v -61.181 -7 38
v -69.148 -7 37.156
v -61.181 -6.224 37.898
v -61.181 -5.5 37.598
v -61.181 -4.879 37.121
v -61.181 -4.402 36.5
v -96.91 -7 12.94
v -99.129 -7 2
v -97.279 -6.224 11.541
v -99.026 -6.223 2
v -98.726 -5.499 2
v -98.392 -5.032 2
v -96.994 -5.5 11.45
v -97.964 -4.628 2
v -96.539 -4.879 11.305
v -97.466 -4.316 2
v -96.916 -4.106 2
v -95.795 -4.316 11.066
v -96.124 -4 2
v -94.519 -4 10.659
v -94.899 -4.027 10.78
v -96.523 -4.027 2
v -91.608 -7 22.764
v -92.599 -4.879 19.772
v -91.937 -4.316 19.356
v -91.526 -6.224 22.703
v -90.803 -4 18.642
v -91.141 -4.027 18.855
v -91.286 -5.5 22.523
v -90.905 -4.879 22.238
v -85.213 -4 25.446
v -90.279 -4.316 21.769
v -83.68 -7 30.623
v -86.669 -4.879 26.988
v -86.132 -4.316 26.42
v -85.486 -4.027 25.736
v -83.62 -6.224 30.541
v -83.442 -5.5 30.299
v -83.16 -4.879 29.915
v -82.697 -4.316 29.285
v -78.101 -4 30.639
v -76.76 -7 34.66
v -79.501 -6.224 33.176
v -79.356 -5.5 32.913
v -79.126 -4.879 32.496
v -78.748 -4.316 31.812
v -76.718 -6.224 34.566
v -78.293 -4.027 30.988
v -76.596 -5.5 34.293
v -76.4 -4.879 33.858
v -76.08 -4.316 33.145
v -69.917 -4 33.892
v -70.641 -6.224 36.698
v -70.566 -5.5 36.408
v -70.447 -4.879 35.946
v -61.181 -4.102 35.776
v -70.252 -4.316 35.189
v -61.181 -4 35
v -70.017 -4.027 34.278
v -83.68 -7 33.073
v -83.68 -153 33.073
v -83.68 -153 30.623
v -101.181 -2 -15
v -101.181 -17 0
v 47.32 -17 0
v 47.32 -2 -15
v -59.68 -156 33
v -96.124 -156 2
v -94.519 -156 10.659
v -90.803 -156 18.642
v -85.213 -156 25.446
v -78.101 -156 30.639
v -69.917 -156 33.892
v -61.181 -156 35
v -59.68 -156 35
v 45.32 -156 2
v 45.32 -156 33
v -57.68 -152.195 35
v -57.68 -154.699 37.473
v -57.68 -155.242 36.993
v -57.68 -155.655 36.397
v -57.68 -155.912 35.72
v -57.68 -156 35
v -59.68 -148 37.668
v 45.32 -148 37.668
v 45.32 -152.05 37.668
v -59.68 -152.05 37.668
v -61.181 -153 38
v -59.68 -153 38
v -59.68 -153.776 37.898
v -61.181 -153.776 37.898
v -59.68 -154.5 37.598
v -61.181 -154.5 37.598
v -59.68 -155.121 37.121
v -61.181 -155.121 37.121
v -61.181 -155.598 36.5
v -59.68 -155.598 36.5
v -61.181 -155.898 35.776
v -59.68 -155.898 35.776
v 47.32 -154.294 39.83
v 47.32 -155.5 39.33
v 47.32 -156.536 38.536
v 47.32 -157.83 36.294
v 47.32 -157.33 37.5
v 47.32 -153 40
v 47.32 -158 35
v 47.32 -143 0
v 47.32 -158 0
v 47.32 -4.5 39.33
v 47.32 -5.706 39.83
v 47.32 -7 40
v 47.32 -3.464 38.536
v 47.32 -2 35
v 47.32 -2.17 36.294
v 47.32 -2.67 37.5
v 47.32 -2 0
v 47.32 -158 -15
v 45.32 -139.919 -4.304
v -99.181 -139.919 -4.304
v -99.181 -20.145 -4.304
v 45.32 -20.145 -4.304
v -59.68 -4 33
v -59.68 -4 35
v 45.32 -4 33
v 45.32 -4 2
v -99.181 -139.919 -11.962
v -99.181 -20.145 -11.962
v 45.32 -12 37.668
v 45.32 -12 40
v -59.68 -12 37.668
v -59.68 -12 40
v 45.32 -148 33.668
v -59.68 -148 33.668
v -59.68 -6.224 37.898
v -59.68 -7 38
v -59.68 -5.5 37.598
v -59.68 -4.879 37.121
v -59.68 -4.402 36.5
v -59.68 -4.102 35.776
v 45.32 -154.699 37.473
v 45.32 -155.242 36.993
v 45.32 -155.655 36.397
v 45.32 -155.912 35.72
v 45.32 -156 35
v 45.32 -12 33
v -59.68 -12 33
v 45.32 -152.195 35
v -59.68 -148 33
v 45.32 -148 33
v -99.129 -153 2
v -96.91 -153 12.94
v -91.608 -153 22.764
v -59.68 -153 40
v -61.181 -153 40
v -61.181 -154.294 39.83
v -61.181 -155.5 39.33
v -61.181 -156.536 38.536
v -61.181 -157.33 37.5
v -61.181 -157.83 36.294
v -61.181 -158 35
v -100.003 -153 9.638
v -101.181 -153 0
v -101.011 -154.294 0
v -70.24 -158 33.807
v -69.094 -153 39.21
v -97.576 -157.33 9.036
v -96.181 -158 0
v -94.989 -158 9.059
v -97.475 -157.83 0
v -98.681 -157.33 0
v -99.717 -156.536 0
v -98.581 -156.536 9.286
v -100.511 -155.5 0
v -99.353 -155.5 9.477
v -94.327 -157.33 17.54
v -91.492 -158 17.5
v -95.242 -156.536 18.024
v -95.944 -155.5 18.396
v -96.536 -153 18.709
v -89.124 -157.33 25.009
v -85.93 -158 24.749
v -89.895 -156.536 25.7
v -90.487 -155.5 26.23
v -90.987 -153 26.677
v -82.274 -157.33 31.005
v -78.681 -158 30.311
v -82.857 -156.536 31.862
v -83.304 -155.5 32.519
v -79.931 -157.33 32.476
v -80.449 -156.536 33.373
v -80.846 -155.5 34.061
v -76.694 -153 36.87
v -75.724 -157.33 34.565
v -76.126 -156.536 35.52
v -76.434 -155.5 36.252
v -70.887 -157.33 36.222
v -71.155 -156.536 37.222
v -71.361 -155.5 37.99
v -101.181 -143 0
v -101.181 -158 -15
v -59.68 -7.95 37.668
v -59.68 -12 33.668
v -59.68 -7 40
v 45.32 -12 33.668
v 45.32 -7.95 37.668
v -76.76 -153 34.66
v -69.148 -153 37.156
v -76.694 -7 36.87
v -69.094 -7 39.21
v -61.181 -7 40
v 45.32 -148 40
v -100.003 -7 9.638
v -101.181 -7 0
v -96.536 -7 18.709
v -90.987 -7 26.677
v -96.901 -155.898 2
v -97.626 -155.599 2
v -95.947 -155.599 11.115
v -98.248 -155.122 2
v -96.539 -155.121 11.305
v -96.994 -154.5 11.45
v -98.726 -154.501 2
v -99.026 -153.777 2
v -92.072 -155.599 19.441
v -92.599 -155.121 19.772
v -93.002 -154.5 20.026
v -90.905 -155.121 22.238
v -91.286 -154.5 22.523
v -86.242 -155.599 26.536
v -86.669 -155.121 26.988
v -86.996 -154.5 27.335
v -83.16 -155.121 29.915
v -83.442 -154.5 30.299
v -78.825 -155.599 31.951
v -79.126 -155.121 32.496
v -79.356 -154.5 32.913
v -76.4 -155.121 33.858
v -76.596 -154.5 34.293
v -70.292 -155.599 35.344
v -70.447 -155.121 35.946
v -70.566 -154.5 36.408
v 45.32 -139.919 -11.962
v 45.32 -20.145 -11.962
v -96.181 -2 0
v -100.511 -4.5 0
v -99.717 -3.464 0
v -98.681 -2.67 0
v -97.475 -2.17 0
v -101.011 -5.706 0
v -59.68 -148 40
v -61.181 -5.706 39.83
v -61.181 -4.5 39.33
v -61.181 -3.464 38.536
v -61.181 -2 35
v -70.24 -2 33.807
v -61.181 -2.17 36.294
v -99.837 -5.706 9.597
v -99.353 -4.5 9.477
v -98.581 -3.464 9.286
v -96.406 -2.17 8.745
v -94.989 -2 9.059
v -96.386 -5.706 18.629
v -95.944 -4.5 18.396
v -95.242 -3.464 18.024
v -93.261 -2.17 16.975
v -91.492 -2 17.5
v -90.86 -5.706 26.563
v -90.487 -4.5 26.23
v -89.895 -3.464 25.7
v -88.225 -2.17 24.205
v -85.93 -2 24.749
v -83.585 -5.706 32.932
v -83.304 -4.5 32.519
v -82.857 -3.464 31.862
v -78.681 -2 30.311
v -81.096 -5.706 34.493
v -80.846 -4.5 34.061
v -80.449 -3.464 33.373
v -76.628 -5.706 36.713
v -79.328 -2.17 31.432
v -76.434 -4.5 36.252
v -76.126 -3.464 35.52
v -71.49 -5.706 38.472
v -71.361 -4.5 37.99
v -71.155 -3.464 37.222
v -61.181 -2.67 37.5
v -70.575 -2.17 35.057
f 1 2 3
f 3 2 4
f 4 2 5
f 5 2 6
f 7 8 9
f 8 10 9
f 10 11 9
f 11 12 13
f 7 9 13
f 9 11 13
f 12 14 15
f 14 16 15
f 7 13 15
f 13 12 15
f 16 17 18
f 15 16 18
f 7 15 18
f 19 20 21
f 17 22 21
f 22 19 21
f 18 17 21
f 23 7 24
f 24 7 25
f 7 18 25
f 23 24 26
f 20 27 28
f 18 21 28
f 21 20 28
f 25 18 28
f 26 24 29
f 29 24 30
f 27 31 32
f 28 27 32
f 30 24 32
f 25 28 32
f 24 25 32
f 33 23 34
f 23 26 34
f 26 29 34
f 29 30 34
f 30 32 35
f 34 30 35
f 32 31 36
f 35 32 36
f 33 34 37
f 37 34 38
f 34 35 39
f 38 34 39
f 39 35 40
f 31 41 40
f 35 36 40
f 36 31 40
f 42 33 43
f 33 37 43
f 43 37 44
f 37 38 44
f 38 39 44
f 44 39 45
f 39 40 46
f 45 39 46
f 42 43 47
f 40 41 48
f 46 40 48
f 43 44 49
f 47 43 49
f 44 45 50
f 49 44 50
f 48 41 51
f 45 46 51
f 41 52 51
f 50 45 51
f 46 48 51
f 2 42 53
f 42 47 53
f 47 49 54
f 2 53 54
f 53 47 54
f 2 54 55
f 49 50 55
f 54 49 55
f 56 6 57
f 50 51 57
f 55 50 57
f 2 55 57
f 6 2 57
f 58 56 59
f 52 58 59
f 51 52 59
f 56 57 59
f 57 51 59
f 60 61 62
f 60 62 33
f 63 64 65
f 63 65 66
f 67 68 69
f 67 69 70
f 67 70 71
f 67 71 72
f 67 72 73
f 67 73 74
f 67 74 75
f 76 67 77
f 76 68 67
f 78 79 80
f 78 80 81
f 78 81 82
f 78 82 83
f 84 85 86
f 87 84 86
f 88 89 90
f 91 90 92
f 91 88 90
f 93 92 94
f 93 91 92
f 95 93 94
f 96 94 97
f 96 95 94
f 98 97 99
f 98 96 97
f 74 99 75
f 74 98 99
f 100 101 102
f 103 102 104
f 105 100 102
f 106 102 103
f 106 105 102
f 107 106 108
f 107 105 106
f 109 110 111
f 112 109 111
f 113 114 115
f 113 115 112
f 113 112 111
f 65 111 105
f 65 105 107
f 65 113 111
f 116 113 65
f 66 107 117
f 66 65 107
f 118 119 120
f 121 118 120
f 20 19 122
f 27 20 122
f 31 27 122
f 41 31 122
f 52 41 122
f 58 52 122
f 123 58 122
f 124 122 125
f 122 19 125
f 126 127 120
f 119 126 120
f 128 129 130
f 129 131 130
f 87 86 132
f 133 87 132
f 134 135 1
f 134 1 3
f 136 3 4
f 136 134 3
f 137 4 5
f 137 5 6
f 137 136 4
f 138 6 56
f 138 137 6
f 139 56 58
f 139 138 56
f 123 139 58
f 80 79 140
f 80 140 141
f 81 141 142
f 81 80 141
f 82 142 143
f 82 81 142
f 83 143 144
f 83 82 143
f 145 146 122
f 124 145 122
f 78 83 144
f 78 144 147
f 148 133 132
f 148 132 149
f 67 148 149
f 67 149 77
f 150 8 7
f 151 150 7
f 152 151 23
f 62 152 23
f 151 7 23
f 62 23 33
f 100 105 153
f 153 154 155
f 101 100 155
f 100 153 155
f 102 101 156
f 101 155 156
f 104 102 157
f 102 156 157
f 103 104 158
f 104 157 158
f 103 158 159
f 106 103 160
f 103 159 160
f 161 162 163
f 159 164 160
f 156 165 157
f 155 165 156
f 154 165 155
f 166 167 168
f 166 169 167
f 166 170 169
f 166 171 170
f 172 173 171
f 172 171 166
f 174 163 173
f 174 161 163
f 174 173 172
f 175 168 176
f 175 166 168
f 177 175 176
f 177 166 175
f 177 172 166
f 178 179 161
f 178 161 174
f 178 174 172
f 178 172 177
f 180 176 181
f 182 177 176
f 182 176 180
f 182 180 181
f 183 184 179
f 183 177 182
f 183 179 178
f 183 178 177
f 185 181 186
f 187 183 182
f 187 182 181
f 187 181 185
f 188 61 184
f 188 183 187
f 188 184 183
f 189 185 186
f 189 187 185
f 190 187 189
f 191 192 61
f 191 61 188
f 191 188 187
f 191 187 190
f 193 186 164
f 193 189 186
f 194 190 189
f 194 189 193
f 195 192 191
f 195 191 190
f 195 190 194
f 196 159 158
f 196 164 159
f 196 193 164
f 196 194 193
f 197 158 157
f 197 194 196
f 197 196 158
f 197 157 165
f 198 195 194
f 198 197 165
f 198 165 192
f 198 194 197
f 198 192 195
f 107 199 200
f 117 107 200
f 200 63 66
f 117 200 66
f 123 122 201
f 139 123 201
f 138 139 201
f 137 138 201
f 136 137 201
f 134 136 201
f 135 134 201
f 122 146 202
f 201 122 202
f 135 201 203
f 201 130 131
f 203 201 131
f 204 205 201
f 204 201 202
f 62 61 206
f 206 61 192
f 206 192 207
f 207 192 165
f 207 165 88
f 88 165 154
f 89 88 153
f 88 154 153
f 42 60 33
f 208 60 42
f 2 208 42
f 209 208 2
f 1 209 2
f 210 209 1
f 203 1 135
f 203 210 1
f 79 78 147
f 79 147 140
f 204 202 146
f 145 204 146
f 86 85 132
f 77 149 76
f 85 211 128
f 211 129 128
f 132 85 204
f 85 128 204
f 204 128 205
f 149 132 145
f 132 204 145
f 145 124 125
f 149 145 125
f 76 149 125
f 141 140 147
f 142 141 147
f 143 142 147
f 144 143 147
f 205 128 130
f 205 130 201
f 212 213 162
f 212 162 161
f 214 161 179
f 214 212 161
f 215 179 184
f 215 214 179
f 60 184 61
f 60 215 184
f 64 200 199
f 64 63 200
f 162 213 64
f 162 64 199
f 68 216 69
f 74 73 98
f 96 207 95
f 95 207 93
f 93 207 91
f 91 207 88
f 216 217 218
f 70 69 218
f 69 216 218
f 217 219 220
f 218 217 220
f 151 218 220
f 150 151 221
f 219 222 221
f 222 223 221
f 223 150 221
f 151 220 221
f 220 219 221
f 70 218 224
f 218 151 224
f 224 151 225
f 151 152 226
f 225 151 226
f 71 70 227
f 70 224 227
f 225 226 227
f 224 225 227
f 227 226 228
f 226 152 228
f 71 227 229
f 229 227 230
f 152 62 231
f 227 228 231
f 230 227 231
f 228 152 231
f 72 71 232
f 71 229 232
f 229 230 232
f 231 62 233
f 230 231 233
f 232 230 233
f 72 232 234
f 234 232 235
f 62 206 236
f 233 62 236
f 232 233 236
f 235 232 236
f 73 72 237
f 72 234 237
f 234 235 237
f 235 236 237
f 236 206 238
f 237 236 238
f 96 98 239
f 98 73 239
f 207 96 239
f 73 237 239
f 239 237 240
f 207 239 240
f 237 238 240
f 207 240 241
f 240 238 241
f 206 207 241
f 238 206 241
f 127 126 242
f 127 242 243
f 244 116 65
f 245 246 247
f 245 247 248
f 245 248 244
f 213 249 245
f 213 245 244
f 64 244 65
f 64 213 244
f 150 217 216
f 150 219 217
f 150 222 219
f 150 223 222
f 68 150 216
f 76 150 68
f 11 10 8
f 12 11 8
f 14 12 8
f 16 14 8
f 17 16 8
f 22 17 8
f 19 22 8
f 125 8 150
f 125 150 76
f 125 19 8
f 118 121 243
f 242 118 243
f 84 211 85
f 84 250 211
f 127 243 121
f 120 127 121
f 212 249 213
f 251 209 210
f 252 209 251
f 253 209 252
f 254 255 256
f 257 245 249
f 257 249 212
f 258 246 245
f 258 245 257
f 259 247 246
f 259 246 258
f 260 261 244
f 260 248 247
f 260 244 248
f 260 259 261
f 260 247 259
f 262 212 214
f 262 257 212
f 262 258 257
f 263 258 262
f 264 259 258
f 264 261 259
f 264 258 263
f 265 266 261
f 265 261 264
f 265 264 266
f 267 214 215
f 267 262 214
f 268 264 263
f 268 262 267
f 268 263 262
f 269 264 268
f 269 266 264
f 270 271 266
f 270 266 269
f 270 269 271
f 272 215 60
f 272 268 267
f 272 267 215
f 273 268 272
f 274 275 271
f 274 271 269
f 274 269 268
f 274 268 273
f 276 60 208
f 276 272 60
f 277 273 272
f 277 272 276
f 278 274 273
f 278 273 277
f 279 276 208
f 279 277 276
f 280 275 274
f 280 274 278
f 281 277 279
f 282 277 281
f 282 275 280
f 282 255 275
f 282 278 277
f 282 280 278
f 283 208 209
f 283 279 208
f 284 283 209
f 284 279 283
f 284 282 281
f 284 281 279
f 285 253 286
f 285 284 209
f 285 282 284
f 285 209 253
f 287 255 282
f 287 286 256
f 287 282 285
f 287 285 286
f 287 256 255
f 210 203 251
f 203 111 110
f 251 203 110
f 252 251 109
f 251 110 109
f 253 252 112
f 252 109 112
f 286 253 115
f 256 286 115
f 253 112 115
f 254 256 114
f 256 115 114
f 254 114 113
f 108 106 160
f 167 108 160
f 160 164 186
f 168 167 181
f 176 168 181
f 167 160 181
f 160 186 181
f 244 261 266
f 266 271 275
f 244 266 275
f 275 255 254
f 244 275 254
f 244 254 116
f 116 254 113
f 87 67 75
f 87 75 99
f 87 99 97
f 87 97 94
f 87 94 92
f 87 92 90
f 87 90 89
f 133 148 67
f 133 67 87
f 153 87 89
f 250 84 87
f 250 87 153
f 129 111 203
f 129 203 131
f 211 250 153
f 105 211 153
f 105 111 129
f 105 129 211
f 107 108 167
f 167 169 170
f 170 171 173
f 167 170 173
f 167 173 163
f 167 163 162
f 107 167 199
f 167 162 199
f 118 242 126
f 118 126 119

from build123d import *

# Parameters (mm, degrees)
SKETCH1_W            = 148.500856602
SKETCH1_H            = 156
BOSS_EXTRUDE1_DEPTH  = 40
FILLET3_R            = 40
FILLET4_R            = 5
SHELL4_T             = -2
SKETCH19_W           = 131
SKETCH19_H           = 146
CUT_EXTRUDE8_DEPTH   = 10
SKETCH21_W           = 107
SKETCH21_H           = 2
BOSS_EXTRUDE7_DEPTH  = 5
BOSS_EXTRUDE8_START  = -107
BOSS_EXTRUDE8_DEPTH  = 107
CUT_EXTRUDE9_DEPTH   = 107
BOSS_EXTRUDE9_DEPTH  = 2
BOSS_EXTRUDE10_DEPTH = 15
CUT_EXTRUDE10_DEPTH  = 170
SHELL5_START         = -57.680419874
SHELL5_DEPTH         = 103
SKETCH29_W           = 7.658063704
SKETCH29_H           = 119.773909492
CUT_EXTRUDE11_DEPTH  = 170
SKETCH31_W           = 7.658063704
SKETCH31_H           = 119.773909492
BOSS_EXTRUDE12_DEPTH = 2
SKETCH32_W           = 7.658063704
SKETCH32_H           = 119.773909492
BOSS_EXTRUDE13_DEPTH = 2


# Read off the part's stored shape, not the designer's step: Shell5
# Some blends are built 0.0001 mm under size
with BuildPart() as part:
    # Sketch1 → Boss-Extrude1 (new body)
    with BuildSketch(Plane.XY):
        with Locations((-26.930848175, -80)):
            Rectangle(SKETCH1_W, SKETCH1_H)
    extrude(amount=BOSS_EXTRUDE1_DEPTH)

    # Fillet3
    fillet3_edges = [part.edges().sort_by_distance(p)[0] for p in [
        (-101.181276476, -80, 40),
    ]]
    fillet(fillet3_edges, radius=FILLET3_R - 0.0001)  # a hair under: the kernel refuses the full size

    # Fillet4
    # the kernel refuses this fillet: 5 mm, written as the material it takes off along each edge
    with BuildSketch(Plane(origin=(-61.181376476, -158, 40), x_dir=(0, 1, 0), z_dir=(1, 0, 0))) as fillet4_piece_1:
        with BuildLine():
            CenterArc((FILLET4_R, -FILLET4_R), FILLET4_R, 90, 90)
            Line((0, -FILLET4_R), (0, 0))
            Line((0, 0), (FILLET4_R, 0))
        make_face()
    extrude(amount=121.000956602, mode=Mode.SUBTRACT)
    with BuildSketch(Plane(origin=(-61.181376476, -158, 0.0001), x_dir=(-1, 0, 0), z_dir=(0, 0, -1))) as fillet4_piece_2:
        with BuildLine():
            CenterArc((39.9999 - FILLET4_R, FILLET4_R), FILLET4_R, 270, 90)
            Line((39.9999 - FILLET4_R, 0), (39.9999, 0))
            Line((39.9999, 0), (39.9999, FILLET4_R))
        make_face()
    revolve(axis=Axis((-61.181376476, -158, 0.0001), (0, 1, 0)), revolution_arc=90, mode=Mode.SUBTRACT)
    with BuildSketch(Plane(origin=(-61.181376476, -2, 0.0001), x_dir=(-1, 0, 0), z_dir=(0, 0, -1))) as fillet4_piece_3:
        with BuildLine():
            CenterArc((39.9999 - FILLET4_R, -FILLET4_R), FILLET4_R, 0, 90)
            Line((39.9999, -FILLET4_R), (39.9999, 0))
            Line((39.9999, 0), (39.9999 - FILLET4_R, 0))
        make_face()
    revolve(axis=Axis((-61.181376476, -2, 0.0001), (0, 1, 0)), revolution_arc=90, mode=Mode.SUBTRACT)
    with BuildSketch(Plane(origin=(59.819580126, -2, 40), x_dir=(0, 0, -1), z_dir=(-1, 0, 0))) as fillet4_piece_4:
        with BuildLine():
            CenterArc((FILLET4_R, FILLET4_R), FILLET4_R, 180, 90)
            Line((0, FILLET4_R), (0, 0))
            Line((0, 0), (FILLET4_R, 0))
        make_face()
    extrude(amount=121.000956602, mode=Mode.SUBTRACT)
    with BuildSketch(Plane(origin=(-101.181276476, -2, -12.5), x_dir=(1, 0, 0), z_dir=(0, 0, 1)), Plane(origin=(-101.181276476, -158, -12.5), x_dir=(0, 1, 0), z_dir=(0, 0, 1))) as fillet4_piece_5:
        with BuildLine():
            CenterArc((FILLET4_R, -FILLET4_R), FILLET4_R, 90, 90)
            Line((0, -FILLET4_R), (0, 0))
            Line((0, 0), (FILLET4_R, 0))
        make_face()
    extrude(amount=12.5001, mode=Mode.SUBTRACT)

    # Shell4
    shell4_openings = [part.faces().sort_by_distance(p)[0] for p in [
        (47.319580126, -80, 19.967473228),
    ]]
    offset(amount=SHELL4_T, openings=shell4_openings)

    # Sketch19 → Cut-Extrude8 (cut)
    with BuildSketch(Plane.XY.offset(40)):
        with Locations((-18.180419874, -80)):
            Rectangle(SKETCH19_W, SKETCH19_H)
    extrude(amount=-CUT_EXTRUDE8_DEPTH, mode=Mode.SUBTRACT)

    # Sketch21 → Boss-Extrude7 (add)
    with BuildSketch(Plane(origin=(0, -153, 0), x_dir=(1, 0, 0), z_dir=(0, 1, 0))):
        with Locations((-6.180419874, -39)):
            Rectangle(SKETCH21_W, SKETCH21_H)
    boss_extrude7 = extrude(amount=BOSS_EXTRUDE7_DEPTH)

    # Sketch22 → Boss-Extrude8 (add)
    with BuildSketch(Plane(origin=(47.319580126, 0, 0), x_dir=(0, 0, -1), z_dir=(1, 0, 0)).offset(BOSS_EXTRUDE8_START)):
        with BuildLine():
            Line((-38, -148), (-33, -148))
            Line((-33, -148), (-33, -156))
            Line((-33, -156), (-35, -156))
            ThreePointArc((-35, -156), (-37.121320344, -155.121320344), (-38, -153))
            Line((-38, -153), (-38, -148))
        make_face()
    boss_extrude8 = extrude(amount=BOSS_EXTRUDE8_DEPTH)

    # Sketch23 → Cut-Extrude9 (cut)
    with BuildSketch(Plane(origin=(47.319580126, 0, 0), x_dir=(0, 0, -1), z_dir=(1, 0, 0))):
        Polygon((-37.667948512, -148), (-37.667948512, -152.05), (-33.667948512, -148), align=None)
    cut_extrude9 = extrude(amount=-CUT_EXTRUDE9_DEPTH, mode=Mode.SUBTRACT)

    # Mirror1: Boss-Extrude7, Boss-Extrude8, Cut-Extrude9 across plane
    add(boss_extrude7.mirror(Plane.ZX.offset(-80)))
    add(boss_extrude8.mirror(Plane.ZX.offset(-80)))
    add(cut_extrude9.mirror(Plane.ZX.offset(-80)), mode=Mode.SUBTRACT)

    # Sketch25 → Boss-Extrude9 (add)
    with BuildSketch(Plane(origin=(47.319580126, 0, 0), x_dir=(0, 0, -1), z_dir=(1, 0, 0))):
        Polygon((-40, -148), (-37.667948512, -148), (-37.667948512, -152.05), (-33.667948512, -148), (-33, -148), (-33, -156), (-2, -156), (-2, -4), (-33, -4), (-33, -12), (-33.667948512, -12), (-37.667948512, -7.95), (-37.667948512, -12), (-40, -12), align=None)
    extrude(amount=-BOSS_EXTRUDE9_DEPTH)

    # Sketch26 → Boss-Extrude10 (add)
    with BuildSketch(Plane(origin=(0, 0, 0), x_dir=(-1, 0, 0), z_dir=(0, 0, -1))):
        Polygon((101.181276476, -7), (101.181276476, -153), (101.181276476, -158), (96.181276476, -158), (-47.319580126, -158), (-47.319580126, -2), (96.181276476, -2), (101.181276476, -2), align=None)
    extrude(amount=BOSS_EXTRUDE10_DEPTH)

    # Sketch27 → Cut-Extrude10 (cut)
    with BuildSketch(Plane.ZY.offset(101.181276476)):
        Polygon((0, -2), (0, -17), (-15, -2), align=None)
        Polygon((0, -158), (0, -143), (-15, -158), align=None)
    extrude(amount=-CUT_EXTRUDE10_DEPTH, mode=Mode.SUBTRACT)

    # Shell5 outline → Shell5 (cut)
    with BuildSketch(Plane.YZ.offset(SHELL5_START)):
        with BuildLine():
            Line((-152.194861825, 35), (-154.69858558, 37.472813585))
            ThreePointArc((-154.69858558, 37.472813585), (-155.654784053, 36.397183463), (-156, 35))
            Line((-156, 35), (-152.194861825, 35))
        make_face()
    extrude(amount=SHELL5_DEPTH, mode=Mode.SUBTRACT)

    # Sketch29 → Cut-Extrude11 (cut)
    with BuildSketch(Plane.ZY.offset(101.181276476)):
        with Locations((-8.13310084, -80.031899357)):
            Rectangle(SKETCH29_W, SKETCH29_H)
    extrude(amount=-CUT_EXTRUDE11_DEPTH, mode=Mode.SUBTRACT)

    # Sketch31 → Boss-Extrude12 (add)
    with BuildSketch(Plane(origin=(47.319580126, 0, 0), x_dir=(0, 0, -1), z_dir=(1, 0, 0))):
        with Locations((8.13310084, -80.031899357)):
            Rectangle(SKETCH31_W, SKETCH31_H)
    extrude(amount=-BOSS_EXTRUDE12_DEPTH)

    # Sketch32 → Boss-Extrude13 (add)
    with BuildSketch(Plane.ZY.offset(101.181276476)):
        with Locations((-8.13310084, -80.031899357)):
            Rectangle(SKETCH32_W, SKETCH32_H)
    extrude(amount=-BOSS_EXTRUDE13_DEPTH)


solid = part.part
